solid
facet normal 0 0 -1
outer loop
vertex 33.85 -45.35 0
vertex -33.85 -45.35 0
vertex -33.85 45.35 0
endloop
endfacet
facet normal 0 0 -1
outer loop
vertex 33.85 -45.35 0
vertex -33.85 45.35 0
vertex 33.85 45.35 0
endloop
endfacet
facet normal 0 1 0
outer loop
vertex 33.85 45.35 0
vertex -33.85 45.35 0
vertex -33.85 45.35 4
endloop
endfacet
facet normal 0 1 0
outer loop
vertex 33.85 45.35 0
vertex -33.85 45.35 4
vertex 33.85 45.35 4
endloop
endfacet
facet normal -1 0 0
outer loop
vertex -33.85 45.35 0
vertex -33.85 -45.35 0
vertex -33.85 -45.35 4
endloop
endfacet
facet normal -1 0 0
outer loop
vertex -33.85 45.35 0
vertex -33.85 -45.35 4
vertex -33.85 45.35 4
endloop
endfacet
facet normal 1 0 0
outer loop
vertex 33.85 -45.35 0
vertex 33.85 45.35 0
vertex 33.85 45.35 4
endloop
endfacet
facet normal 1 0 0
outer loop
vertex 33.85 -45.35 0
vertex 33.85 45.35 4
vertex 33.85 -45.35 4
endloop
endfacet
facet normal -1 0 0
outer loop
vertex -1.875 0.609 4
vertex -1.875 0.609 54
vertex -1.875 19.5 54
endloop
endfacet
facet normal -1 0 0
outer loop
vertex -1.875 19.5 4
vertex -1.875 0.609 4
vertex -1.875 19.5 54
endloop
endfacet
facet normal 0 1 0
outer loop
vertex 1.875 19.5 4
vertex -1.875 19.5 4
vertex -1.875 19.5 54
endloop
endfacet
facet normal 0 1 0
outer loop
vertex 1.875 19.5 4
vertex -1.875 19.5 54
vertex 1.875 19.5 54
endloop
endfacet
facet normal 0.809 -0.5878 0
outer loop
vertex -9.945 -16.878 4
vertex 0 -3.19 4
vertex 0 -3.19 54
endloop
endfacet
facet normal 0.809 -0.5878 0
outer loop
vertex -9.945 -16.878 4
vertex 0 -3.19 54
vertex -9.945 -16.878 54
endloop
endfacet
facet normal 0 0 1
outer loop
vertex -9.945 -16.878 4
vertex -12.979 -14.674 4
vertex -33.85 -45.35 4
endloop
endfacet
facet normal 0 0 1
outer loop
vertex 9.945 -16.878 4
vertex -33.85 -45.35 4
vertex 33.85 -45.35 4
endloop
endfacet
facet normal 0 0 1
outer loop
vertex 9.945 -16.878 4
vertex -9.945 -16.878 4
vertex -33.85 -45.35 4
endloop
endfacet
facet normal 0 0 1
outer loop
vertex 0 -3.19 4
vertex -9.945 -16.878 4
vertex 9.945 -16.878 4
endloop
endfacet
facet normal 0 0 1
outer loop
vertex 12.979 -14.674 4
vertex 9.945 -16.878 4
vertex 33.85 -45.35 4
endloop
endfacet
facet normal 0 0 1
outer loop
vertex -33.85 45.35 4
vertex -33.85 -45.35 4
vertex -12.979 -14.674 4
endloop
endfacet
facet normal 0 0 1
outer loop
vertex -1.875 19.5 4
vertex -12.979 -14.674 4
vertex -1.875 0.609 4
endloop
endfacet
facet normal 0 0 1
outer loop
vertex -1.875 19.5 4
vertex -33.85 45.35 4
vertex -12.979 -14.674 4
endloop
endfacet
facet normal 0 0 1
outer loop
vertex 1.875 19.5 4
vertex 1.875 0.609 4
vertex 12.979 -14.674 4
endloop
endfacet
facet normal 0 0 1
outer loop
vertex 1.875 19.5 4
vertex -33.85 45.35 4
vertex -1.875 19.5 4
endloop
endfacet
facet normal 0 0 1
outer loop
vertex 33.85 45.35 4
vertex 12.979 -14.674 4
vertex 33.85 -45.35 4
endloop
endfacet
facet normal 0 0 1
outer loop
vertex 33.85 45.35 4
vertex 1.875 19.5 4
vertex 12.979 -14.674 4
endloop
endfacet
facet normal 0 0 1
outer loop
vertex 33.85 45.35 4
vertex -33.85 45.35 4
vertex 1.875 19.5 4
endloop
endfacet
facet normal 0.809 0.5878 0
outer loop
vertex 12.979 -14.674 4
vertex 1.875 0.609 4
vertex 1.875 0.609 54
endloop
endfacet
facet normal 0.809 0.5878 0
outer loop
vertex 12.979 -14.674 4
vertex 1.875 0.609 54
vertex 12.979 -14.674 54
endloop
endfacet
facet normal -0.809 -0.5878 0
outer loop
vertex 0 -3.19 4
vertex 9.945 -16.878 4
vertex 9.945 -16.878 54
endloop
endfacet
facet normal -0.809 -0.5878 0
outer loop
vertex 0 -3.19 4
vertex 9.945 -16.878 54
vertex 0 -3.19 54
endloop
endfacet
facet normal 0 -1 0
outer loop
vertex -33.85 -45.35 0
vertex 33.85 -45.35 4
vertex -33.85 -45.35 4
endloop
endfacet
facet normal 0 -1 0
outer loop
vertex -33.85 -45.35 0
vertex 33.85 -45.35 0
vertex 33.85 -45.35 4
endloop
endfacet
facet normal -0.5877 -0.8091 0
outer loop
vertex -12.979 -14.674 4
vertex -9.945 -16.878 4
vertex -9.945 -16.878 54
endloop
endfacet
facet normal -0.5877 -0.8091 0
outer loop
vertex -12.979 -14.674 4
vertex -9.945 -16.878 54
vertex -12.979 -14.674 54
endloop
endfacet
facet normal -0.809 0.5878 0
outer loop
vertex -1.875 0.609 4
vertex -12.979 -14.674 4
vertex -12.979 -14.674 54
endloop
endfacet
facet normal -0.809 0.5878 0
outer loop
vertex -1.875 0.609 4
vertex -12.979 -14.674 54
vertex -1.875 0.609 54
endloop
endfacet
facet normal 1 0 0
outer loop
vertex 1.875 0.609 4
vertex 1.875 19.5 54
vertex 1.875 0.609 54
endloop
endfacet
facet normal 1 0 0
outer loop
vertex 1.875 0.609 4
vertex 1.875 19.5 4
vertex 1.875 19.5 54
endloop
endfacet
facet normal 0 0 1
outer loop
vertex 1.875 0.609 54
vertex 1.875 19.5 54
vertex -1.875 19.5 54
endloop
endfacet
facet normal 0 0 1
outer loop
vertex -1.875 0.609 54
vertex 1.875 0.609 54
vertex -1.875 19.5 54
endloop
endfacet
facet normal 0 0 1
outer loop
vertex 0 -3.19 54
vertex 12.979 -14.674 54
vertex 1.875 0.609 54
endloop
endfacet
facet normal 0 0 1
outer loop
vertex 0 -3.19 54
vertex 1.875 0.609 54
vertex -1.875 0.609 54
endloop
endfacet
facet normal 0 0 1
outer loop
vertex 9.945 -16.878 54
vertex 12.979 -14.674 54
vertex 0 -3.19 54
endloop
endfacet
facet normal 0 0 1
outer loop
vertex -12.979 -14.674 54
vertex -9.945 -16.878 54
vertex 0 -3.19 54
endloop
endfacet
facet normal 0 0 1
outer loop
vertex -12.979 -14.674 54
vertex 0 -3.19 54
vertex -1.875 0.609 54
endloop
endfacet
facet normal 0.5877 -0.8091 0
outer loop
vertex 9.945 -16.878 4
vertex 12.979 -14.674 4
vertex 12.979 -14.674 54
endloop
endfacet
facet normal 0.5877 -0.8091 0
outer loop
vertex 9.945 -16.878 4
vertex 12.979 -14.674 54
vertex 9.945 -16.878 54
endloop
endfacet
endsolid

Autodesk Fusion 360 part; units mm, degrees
sketch "Sketch1" plane through (0, 0, 0) normal (0, 0, 1) x (1, 0, 0)
  line L0 (-33.85, 45.35) -> (33.85, 45.35)
  line L1 (33.85, 45.35) -> (33.85, -45.35)
  line L2 (33.85, -45.35) -> (-33.85, -45.35)
  line L3 (-33.85, -45.35) -> (-33.85, 45.35)
  line L4 (0, 0) -> (-33.85, 0)
  line L5 (0, 0) -> (0, 45.35)
  dimension "d13" = 90.7
  dimension "d14" = 67.7
extrude "Extrude1" add sketch "Sketch1" along normal blind 4
sketch "Sketch3" plane through (0, 0, 4) normal (0, 0, 1) x (-1, 0, 0)
  line L0 (1.875, -19.5) -> (-1.875, -19.5)
  line L1 (-1.875, -19.5) -> (-1.875, -0.6092)
  line L2 (-1.875, -0.6092) -> (-12.9787, 14.6737)
  line L3 (-12.9787, 14.6737) -> (-9.9449, 16.8779)
  line L4 (-9.9449, 16.8779) -> (0, 3.1899)
  line L5 (0, 3.1899) -> (9.9449, 16.8779)
  line L6 (9.9449, 16.8779) -> (12.9787, 14.6737)
  line L7 (12.9787, 14.6737) -> (1.875, -0.6092)
  line L8 (1.875, -0.6092) -> (1.875, -19.5)
  line L9 (0, -19.5) -> (0, 0)
  line L10 (0, 0) -> (-11.4618, 15.7758)
  line L11 (11.4618, 15.7758) -> (0, 0)
  line L12 (33.85, 45.35) -> (-33.85, 45.35)
  line L13 (-33.85, 45.35) -> (-33.85, -45.35)
  line L14 (-33.85, -45.35) -> (33.85, -45.35)
  line L15 (33.85, -45.35) -> (33.85, 45.35)
  dimension "d7" = 144
  dimension "d8" = 144
  dimension "d9" = 3.75
  dimension "d10" = 19.5
extrude "Extrude3" add sketch "Sketch3" along normal blind 50 contours L0 L6 L7 L8 L9 L11 | L0 L1 L2 L3 L9 L10 | L3 L4 L5 L6 L10 L11
